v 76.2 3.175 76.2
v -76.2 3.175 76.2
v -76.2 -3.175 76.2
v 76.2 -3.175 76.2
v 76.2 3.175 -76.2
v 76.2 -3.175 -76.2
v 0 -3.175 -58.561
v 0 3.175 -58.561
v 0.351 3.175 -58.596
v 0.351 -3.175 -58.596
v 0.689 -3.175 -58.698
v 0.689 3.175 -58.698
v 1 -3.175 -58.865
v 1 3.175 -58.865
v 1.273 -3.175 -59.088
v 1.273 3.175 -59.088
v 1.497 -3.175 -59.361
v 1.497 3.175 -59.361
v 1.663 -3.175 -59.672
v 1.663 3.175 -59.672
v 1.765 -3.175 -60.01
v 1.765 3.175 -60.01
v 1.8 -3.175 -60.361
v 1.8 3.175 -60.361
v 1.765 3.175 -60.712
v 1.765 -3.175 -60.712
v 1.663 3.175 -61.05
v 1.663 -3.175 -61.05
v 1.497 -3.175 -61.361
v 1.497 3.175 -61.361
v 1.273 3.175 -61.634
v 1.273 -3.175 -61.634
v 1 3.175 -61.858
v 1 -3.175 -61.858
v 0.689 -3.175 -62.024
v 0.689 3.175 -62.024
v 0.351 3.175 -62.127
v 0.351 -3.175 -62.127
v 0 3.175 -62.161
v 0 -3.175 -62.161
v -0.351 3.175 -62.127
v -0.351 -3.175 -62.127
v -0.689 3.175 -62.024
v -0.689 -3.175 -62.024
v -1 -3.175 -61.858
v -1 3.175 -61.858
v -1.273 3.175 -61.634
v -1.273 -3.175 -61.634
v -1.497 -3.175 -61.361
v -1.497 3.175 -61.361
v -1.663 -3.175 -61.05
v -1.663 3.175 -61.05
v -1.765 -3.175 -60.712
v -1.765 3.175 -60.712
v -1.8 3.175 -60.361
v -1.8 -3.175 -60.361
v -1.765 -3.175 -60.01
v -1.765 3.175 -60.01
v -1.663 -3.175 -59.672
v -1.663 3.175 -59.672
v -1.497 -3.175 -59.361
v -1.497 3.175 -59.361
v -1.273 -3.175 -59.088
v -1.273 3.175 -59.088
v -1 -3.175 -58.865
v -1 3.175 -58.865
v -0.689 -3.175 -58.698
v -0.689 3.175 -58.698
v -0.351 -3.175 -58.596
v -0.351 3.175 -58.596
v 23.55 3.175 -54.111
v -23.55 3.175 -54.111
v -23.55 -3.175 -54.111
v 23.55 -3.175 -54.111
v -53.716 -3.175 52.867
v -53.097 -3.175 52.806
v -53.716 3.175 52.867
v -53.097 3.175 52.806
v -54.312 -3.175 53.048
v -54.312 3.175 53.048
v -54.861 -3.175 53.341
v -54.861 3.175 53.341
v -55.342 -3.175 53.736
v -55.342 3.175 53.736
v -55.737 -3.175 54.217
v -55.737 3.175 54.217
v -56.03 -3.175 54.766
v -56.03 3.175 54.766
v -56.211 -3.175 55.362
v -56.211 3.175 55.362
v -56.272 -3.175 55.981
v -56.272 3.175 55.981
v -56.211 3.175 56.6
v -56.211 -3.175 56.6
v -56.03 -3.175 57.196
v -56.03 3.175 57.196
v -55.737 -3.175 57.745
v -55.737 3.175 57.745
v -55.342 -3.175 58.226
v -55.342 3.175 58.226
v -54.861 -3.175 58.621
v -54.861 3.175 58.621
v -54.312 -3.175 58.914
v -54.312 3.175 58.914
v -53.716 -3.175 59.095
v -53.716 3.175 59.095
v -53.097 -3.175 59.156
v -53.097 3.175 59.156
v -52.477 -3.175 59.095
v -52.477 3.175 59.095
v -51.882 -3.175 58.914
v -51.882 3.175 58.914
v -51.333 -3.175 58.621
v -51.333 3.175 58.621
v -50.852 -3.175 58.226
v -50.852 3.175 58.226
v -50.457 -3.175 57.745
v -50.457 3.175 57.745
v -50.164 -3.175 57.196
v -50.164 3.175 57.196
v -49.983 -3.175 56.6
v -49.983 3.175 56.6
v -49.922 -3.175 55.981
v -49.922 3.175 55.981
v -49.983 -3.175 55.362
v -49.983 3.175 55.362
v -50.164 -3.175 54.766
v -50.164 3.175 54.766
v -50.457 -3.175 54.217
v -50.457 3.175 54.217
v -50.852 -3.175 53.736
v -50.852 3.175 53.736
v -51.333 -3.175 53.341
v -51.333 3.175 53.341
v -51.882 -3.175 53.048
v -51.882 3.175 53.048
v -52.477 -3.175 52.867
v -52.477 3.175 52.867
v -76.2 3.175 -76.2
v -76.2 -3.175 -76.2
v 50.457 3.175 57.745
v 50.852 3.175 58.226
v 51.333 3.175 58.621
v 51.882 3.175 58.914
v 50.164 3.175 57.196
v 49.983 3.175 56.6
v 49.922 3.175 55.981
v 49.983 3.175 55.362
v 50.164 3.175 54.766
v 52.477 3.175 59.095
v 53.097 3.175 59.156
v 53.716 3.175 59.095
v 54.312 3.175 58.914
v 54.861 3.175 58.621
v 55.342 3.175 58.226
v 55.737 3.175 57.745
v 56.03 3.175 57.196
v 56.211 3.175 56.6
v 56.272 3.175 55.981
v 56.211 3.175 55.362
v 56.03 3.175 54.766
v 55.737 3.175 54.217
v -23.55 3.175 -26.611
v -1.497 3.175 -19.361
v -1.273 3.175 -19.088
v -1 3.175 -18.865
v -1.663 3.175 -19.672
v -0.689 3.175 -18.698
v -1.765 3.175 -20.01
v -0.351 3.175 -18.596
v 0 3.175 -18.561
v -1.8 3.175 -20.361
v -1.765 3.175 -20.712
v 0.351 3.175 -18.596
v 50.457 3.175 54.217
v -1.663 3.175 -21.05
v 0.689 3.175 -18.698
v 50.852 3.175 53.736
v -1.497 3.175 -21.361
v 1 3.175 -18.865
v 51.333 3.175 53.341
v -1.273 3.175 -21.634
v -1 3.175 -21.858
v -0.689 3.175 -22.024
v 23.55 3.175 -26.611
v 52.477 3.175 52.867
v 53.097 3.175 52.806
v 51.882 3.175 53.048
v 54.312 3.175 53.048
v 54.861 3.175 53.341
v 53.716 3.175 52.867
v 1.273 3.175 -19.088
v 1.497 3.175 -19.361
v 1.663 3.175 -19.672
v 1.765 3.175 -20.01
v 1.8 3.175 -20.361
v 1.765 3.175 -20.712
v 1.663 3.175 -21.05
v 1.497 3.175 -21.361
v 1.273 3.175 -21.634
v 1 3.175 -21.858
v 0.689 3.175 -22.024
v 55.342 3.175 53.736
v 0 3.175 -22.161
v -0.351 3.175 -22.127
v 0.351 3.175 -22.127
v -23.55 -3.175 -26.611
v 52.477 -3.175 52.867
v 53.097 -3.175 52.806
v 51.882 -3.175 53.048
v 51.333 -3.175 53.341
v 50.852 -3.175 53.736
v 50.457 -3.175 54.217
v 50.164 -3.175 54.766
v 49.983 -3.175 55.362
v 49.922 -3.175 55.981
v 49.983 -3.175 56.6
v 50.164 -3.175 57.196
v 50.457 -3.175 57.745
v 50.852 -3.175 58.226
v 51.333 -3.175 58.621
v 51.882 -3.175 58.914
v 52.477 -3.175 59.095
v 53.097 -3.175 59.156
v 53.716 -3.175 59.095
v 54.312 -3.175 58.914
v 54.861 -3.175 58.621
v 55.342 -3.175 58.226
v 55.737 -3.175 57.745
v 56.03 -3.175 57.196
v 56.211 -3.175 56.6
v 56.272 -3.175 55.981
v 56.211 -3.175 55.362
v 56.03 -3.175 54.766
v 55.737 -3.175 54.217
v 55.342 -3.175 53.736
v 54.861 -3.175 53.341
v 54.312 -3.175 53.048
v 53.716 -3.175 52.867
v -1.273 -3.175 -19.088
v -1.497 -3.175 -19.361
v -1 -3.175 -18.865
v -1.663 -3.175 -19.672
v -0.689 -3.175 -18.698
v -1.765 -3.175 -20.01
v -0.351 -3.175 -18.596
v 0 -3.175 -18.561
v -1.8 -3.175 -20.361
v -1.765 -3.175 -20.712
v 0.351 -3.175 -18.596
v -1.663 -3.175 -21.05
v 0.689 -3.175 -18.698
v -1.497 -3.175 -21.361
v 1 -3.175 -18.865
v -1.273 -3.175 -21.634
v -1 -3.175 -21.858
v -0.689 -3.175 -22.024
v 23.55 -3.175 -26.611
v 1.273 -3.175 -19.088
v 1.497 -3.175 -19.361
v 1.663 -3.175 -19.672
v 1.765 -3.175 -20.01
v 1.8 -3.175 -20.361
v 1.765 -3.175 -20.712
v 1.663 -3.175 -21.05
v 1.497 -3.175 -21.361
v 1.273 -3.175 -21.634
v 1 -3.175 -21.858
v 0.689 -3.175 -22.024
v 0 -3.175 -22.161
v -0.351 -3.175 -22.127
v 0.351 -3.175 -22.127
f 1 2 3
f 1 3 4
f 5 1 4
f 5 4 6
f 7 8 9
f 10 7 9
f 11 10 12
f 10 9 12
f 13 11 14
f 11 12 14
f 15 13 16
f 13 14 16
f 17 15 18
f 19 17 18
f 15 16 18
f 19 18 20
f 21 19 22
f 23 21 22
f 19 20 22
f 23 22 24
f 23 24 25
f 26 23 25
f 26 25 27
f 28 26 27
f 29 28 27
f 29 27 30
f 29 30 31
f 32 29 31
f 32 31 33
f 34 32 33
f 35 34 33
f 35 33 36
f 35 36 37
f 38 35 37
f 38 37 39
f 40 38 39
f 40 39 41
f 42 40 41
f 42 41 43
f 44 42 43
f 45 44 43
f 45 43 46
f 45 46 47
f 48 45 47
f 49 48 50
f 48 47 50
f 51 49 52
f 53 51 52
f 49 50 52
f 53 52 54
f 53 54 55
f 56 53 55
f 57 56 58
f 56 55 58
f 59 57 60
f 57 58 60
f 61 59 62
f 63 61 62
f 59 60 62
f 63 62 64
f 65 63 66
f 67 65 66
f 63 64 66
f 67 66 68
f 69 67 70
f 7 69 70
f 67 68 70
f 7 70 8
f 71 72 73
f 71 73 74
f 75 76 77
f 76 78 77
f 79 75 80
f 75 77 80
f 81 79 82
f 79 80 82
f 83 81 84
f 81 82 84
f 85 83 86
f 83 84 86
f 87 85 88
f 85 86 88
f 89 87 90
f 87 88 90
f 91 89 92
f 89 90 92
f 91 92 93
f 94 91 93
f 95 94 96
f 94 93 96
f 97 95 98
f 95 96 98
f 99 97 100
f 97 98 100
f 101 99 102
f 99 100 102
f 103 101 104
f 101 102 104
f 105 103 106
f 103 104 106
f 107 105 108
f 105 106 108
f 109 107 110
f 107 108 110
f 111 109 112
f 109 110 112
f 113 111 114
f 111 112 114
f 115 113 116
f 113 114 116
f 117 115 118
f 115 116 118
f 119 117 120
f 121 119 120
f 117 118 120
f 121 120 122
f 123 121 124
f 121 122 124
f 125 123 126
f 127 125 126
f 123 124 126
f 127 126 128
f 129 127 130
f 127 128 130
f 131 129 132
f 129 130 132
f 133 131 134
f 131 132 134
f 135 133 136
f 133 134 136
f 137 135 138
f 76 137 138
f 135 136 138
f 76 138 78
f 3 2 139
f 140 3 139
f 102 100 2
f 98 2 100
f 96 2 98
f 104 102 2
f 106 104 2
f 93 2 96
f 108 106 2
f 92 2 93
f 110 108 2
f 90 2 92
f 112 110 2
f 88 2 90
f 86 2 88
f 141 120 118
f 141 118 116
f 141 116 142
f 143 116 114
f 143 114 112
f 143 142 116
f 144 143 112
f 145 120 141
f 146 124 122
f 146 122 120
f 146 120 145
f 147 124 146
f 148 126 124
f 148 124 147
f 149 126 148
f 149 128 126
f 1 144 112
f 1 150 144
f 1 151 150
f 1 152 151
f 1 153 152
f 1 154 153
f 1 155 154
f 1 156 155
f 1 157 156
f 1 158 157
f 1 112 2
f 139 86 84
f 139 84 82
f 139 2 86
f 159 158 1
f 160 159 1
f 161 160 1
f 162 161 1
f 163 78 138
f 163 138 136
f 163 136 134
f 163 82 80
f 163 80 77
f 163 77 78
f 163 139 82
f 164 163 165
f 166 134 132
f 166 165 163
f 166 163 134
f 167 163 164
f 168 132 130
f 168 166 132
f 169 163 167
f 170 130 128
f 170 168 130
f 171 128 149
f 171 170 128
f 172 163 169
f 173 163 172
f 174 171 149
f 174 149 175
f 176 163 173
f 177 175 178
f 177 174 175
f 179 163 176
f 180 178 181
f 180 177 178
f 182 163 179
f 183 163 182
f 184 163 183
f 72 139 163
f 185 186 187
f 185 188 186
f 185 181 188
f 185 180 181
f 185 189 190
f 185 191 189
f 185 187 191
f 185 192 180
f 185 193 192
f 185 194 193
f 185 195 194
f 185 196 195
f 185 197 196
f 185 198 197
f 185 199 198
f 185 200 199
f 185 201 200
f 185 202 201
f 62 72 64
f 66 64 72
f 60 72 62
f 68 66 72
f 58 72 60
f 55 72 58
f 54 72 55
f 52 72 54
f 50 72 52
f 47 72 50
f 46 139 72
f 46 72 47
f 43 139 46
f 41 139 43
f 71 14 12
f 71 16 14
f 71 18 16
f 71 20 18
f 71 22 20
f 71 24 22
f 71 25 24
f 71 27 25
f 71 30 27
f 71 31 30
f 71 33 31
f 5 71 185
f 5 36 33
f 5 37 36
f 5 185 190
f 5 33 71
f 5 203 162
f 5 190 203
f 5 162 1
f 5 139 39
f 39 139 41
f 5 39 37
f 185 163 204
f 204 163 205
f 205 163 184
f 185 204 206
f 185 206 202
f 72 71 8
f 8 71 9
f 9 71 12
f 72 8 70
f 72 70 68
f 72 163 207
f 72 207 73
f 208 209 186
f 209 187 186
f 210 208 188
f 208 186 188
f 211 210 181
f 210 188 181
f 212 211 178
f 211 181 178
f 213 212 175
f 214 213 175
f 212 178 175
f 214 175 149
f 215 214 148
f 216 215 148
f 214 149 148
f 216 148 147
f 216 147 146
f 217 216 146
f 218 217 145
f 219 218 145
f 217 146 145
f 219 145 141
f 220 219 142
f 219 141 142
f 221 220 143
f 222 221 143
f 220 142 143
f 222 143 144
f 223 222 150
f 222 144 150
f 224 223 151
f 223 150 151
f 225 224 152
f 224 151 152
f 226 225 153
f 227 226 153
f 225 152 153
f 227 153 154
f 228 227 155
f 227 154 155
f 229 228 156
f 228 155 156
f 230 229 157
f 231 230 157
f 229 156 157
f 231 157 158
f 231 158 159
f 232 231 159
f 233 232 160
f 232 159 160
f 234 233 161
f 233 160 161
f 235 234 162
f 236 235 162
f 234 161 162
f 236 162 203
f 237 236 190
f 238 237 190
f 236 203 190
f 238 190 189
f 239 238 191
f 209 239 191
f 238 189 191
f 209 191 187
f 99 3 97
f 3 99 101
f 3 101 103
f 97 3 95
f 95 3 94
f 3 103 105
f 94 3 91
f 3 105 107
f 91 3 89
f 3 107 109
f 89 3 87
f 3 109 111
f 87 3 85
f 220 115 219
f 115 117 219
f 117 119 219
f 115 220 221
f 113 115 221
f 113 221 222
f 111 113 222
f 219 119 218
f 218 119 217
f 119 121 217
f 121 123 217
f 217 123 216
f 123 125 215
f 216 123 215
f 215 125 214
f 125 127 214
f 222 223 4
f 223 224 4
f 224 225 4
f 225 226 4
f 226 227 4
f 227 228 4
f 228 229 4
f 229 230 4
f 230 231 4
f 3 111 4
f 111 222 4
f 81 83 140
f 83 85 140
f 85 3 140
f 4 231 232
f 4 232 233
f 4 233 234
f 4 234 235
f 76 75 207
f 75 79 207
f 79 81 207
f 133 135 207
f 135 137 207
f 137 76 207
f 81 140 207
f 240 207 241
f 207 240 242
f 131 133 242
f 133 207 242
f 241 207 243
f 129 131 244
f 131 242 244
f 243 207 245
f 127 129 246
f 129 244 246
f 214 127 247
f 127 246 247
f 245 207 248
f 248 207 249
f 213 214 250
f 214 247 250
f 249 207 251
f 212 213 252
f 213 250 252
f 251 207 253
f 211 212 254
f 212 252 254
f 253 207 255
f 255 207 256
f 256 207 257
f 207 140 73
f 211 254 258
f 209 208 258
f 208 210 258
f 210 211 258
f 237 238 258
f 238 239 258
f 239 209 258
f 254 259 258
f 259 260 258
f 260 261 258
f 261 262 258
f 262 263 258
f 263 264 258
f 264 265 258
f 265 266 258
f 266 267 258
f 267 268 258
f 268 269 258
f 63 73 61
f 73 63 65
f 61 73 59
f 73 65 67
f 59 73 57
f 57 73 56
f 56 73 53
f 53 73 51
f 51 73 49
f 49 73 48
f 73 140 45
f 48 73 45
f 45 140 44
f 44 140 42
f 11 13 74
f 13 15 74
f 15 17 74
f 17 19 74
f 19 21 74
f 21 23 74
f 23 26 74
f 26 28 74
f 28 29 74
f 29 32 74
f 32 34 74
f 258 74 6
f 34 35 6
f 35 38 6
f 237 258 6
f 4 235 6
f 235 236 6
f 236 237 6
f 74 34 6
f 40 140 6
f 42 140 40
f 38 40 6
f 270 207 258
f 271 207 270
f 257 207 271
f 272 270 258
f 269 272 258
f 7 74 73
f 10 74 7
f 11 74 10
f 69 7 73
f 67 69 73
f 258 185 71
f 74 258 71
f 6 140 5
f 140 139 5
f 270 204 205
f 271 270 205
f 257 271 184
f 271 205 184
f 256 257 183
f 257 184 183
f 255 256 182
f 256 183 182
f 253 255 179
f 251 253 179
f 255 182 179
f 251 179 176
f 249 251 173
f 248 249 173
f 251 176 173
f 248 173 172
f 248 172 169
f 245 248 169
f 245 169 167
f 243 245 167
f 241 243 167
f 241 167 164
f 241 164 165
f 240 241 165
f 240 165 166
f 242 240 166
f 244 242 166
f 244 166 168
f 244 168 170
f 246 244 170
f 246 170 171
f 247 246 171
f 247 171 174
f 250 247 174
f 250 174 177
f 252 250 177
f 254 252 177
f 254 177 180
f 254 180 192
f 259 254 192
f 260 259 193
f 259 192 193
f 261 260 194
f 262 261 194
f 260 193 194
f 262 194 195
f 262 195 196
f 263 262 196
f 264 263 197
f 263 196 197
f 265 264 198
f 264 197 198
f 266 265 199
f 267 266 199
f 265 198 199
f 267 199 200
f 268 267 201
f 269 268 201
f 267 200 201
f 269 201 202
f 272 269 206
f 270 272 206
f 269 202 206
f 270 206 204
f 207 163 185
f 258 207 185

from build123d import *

# Parameters (mm, degrees)
SKETCH3_W           = 152.4
SKETCH3_H           = 152.4
BOSS_EXTRUDE1_DEPTH = 3.175
SKETCH4_R           = 1.8
SKETCH4_W           = 47.1
SKETCH4_H           = 27.5
CUT_EXTRUDE1_DEPTH  = 10
SKETCH5_R           = 3.175
CUT_EXTRUDE2_DEPTH  = 5


with BuildPart() as part:
    # Sketch3 → Boss-Extrude1 (new, symmetric)
    with BuildSketch(Plane(origin=(0, 0, 0), x_dir=(1, 0, 0), z_dir=(0, 1, 0))):
        Rectangle(SKETCH3_W, SKETCH3_H)
    extrude(amount=BOSS_EXTRUDE1_DEPTH, both=True)

    # Sketch4 → Cut-Extrude1 (cut)
    with BuildSketch(Plane(origin=(0, 3.175, 0), x_dir=(1, 0, 0), z_dir=(0, 1, 0))):
        with Locations(Location((0, 60.361146992, 0), (0, 0, 270))):
            Circle(SKETCH4_R)
        with Locations(Location((0, 20.361146992, 0), (0, 0, 90))):
            Circle(SKETCH4_R)
        with Locations((0, 40.361146992)):
            Rectangle(SKETCH4_W, SKETCH4_H)
    extrude(amount=-CUT_EXTRUDE1_DEPTH, mode=Mode.SUBTRACT)

    # Sketch5 → Cut-Extrude2 (cut, symmetric)
    with BuildSketch(Plane(origin=(0, 0, 0), x_dir=(1, 0, 0), z_dir=(0, 1, 0))):
        with Locations(Location((-53.096867931, -55.98098713, 0), (0, 0, 90))):
            Circle(SKETCH5_R)
        with Locations(Location((53.096867931, -55.98098713, 0), (0, 0, 90))):
            Circle(SKETCH5_R)
    extrude(amount=CUT_EXTRUDE2_DEPTH, both=True, mode=Mode.SUBTRACT)


solid = part.part
